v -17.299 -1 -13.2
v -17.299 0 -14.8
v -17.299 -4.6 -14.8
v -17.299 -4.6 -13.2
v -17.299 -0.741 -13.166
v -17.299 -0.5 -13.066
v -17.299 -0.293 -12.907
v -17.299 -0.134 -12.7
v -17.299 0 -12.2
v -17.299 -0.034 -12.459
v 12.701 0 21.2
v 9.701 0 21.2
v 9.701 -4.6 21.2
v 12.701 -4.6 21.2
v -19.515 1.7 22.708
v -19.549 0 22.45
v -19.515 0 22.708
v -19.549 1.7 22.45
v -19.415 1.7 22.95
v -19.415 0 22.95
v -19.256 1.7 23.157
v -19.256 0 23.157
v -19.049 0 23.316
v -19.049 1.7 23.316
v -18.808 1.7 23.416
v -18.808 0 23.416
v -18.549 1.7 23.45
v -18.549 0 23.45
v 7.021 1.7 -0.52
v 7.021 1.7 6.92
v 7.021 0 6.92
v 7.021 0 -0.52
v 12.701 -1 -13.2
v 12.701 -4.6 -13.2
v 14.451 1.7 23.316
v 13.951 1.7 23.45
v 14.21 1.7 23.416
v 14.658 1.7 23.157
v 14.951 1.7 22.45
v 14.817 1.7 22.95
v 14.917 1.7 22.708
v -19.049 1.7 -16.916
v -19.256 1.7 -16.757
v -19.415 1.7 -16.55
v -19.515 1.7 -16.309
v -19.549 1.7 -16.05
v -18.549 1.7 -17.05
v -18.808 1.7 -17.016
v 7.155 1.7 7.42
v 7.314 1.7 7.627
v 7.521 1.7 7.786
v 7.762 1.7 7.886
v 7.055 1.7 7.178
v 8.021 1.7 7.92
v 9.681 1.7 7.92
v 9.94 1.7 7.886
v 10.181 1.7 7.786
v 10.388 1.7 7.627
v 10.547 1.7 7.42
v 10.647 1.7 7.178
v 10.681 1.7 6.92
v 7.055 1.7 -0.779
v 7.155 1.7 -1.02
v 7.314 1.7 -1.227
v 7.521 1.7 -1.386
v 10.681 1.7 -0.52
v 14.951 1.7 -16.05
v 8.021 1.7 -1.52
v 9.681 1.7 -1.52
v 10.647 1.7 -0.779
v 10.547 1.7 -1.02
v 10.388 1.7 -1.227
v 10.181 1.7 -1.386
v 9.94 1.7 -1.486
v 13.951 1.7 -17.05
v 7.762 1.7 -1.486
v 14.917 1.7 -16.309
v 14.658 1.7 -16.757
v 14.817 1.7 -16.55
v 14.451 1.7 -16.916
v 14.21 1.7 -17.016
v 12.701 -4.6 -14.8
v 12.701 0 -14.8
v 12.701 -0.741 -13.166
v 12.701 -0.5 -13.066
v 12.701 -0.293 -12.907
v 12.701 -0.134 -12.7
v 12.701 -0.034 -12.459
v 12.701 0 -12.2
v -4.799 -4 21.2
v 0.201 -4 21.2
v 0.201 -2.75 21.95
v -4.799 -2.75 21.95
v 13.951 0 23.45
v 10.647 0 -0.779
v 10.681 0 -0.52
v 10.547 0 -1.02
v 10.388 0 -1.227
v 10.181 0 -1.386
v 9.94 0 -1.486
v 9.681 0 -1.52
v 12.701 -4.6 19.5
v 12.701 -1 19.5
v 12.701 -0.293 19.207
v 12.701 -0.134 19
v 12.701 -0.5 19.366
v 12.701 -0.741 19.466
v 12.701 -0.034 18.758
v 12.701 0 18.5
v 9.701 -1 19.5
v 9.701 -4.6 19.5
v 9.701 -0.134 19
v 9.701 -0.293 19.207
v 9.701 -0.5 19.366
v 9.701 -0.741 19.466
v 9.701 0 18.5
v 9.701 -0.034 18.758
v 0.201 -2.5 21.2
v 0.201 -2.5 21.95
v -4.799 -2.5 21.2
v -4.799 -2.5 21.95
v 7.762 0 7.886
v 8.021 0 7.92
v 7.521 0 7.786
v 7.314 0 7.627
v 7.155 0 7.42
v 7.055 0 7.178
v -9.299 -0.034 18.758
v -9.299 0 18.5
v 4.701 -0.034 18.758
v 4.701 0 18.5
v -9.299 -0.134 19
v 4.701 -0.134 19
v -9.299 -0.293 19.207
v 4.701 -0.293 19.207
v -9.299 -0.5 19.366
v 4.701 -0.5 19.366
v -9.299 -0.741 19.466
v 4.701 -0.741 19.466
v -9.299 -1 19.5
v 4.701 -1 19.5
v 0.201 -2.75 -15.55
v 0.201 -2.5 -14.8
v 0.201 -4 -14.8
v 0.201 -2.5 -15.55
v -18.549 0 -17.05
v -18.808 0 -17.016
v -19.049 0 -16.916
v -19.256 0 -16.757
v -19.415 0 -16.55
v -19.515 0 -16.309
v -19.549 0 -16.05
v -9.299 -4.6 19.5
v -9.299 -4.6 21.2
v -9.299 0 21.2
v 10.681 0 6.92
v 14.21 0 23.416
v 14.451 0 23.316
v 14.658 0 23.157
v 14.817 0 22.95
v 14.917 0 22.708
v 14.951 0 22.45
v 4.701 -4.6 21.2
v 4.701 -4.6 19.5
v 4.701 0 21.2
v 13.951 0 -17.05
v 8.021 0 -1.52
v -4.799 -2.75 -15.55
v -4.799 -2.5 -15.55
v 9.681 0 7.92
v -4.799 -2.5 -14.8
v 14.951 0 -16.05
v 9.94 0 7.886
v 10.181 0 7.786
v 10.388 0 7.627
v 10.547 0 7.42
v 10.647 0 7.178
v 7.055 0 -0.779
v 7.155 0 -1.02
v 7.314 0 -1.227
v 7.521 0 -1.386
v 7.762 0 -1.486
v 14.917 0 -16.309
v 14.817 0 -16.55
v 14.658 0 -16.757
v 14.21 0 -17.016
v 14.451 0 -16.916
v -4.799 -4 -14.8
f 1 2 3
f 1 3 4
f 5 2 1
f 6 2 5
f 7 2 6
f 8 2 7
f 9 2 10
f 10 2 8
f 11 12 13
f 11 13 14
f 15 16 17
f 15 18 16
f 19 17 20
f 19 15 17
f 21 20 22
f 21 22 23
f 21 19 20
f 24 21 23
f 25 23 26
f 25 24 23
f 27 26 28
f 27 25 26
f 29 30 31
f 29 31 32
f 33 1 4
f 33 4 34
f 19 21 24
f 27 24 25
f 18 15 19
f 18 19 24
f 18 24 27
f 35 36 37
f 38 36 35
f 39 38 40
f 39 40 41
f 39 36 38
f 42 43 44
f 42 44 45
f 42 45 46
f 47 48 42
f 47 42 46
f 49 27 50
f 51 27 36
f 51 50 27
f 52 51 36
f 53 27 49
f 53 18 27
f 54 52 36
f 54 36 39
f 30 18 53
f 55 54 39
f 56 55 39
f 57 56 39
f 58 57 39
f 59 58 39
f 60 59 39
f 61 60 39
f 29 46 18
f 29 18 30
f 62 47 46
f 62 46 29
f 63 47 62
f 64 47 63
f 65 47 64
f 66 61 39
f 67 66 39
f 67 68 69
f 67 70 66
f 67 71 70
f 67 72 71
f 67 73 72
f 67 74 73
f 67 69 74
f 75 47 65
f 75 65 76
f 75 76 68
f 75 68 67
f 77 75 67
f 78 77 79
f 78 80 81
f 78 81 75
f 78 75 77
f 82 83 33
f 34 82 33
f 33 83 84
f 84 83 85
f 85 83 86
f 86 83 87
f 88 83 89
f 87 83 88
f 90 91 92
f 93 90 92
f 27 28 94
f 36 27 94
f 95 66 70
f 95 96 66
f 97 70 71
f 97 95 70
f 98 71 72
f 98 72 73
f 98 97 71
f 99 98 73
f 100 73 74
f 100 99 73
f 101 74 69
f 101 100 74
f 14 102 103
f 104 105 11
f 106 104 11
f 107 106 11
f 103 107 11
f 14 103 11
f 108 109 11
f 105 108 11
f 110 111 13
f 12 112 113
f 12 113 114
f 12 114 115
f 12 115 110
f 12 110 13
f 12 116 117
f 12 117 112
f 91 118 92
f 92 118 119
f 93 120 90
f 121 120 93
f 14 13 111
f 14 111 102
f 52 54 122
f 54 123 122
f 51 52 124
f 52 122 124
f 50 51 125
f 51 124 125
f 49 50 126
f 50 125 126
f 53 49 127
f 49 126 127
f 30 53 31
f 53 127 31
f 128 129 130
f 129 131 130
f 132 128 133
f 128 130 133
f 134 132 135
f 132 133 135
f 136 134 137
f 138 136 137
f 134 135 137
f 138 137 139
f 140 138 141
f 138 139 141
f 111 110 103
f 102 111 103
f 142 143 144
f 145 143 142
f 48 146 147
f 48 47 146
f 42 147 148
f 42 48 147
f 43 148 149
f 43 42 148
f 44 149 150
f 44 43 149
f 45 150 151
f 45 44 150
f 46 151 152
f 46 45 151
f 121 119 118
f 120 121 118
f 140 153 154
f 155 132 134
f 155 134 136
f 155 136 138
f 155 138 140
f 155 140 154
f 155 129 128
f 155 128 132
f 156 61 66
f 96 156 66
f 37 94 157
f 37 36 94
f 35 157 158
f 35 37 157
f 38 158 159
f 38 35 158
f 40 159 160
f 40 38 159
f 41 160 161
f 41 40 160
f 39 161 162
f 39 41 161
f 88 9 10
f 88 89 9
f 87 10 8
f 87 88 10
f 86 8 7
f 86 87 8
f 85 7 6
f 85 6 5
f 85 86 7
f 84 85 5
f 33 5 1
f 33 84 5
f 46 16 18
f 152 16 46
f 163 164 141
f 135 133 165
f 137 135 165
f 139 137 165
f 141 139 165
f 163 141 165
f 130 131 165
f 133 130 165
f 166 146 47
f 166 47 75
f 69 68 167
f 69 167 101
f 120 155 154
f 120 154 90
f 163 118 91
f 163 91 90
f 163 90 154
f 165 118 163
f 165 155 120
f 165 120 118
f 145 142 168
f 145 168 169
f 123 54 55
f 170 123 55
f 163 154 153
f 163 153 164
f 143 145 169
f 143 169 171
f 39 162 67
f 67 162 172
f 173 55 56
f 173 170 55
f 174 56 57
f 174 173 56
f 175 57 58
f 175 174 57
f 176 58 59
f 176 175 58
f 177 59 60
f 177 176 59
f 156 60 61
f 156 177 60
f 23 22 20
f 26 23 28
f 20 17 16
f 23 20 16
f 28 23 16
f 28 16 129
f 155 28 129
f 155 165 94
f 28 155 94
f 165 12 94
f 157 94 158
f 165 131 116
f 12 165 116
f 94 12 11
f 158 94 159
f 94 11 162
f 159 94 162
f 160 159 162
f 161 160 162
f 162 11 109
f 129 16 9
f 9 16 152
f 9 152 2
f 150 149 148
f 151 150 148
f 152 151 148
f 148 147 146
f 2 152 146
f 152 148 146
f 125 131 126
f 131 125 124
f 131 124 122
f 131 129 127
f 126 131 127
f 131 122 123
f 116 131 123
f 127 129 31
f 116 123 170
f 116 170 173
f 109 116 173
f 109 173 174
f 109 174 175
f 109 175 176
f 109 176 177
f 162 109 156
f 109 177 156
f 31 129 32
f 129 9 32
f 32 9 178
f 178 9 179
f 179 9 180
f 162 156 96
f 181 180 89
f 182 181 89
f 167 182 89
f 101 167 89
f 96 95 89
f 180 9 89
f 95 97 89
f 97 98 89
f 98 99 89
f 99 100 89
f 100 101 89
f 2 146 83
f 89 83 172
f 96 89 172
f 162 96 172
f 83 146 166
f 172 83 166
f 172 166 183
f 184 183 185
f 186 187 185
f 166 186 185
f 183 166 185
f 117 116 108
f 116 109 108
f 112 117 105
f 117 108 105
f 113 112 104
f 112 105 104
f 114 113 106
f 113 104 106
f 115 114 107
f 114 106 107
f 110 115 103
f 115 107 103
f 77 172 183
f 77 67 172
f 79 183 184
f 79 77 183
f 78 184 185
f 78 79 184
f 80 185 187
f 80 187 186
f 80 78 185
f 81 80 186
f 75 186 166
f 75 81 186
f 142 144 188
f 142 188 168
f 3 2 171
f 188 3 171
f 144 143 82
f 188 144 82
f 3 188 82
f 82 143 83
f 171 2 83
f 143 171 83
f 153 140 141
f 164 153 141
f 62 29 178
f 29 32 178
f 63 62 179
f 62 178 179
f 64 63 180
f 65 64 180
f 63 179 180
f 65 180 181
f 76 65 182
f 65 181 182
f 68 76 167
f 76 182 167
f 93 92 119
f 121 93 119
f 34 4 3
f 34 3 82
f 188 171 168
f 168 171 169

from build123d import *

# Parameters (mm, degrees)
SKETCH1_W           = 34.5
SKETCH1_H           = 40.5
BOSS_EXTRUDE1_DEPTH = 1.7
SKETCH2_W           = 3.66
SKETCH2_H           = 9.44
CUT_EXTRUDE1_DEPTH  = 1.7
FILLET1_R           = 1
FILLET2_R           = 1
FILLET3_R           = 1
FILLET4_R           = 1
FILLET5_R           = 1
FILLET6_R           = 1
FILLET7_R           = 1
FILLET8_R           = 1
SKETCH3_W           = 30
SKETCH3_H           = 1.6
BOSS_EXTRUDE2_DEPTH = 4.6
SKETCH4_W           = 3
SKETCH4_H           = 1.7
SKETCH4_W_2         = 14
BOSS_EXTRUDE3_DEPTH = 4.6
BOSS_EXTRUDE4_START = -14.75
BOSS_EXTRUDE4_DEPTH = 5
FILLET9_R           = 1
FILLET10_R          = 1
FILLET11_R          = 1


with BuildPart() as part:
    # Sketch1 → Boss-Extrude1 (new body)
    with BuildSketch(Plane(origin=(0, 0, 0), x_dir=(1, 0, 0), z_dir=(0, 1, 0))):
        with Locations((-2.298701299, -3.199675325)):
            Rectangle(SKETCH1_W, SKETCH1_H)
    extrude(amount=BOSS_EXTRUDE1_DEPTH)

    # Sketch2 → Cut-Extrude1 (cut)
    with BuildSketch(Plane(origin=(0, 1.7, 0), x_dir=(1, 0, 0), z_dir=(0, 1, 0))):
        with Locations((8.851298701, -3.199675325)):
            Rectangle(SKETCH2_W, SKETCH2_H)
    extrude(amount=-CUT_EXTRUDE1_DEPTH, mode=Mode.SUBTRACT)

    # Fillet1
    fillet1_edges = [part.edges().sort_by_distance(p)[0] for p in [
        (14.951298701, 0.85, 23.449675325),
    ]]
    fillet(fillet1_edges, radius=FILLET1_R)

    # Fillet2
    fillet2_edges = [part.edges().sort_by_distance(p)[0] for p in [
        (14.951298701, 0.85, -17.050324675),
    ]]
    fillet(fillet2_edges, radius=FILLET2_R)

    # Fillet3
    fillet3_edges = [part.edges().sort_by_distance(p)[0] for p in [
        (-19.548701299, 0.85, -17.050324675),
    ]]
    fillet(fillet3_edges, radius=FILLET3_R)

    # Fillet4
    fillet4_edges = [part.edges().sort_by_distance(p)[0] for p in [
        (-19.548701299, 0.85, 23.449675325),
    ]]
    fillet(fillet4_edges, radius=FILLET4_R)

    # Fillet5
    fillet5_edges = [part.edges().sort_by_distance(p)[0] for p in [
        (7.021298701, 0.85, 7.919675325),
    ]]
    fillet(fillet5_edges, radius=FILLET5_R)

    # Fillet6
    fillet6_edges = [part.edges().sort_by_distance(p)[0] for p in [
        (7.021298701, 0.85, -1.520324675),
    ]]
    fillet(fillet6_edges, radius=FILLET6_R)

    # Fillet7
    fillet7_edges = [part.edges().sort_by_distance(p)[0] for p in [
        (10.681298701, 0.85, 7.919675325),
    ]]
    fillet(fillet7_edges, radius=FILLET7_R)

    # Fillet8
    fillet8_edges = [part.edges().sort_by_distance(p)[0] for p in [
        (10.681298701, 0.85, -1.520324675),
    ]]
    fillet(fillet8_edges, radius=FILLET8_R)

    # Sketch3 → Boss-Extrude2 (add)
    with BuildSketch(Plane.XZ):
        with Locations((-2.298701299, -14.000324675)):
            Rectangle(SKETCH3_W, SKETCH3_H)
    extrude(amount=BOSS_EXTRUDE2_DEPTH)

    # Sketch4 → Boss-Extrude3 (add)
    with BuildSketch(Plane.XZ):
        with Locations((11.201298701, 20.349675325)):
            Rectangle(SKETCH4_W, SKETCH4_H)
        with Locations((-2.298701299, 20.349675325)):
            Rectangle(SKETCH4_W_2, SKETCH4_H)
    extrude(amount=BOSS_EXTRUDE3_DEPTH)

    # Sketch5 → Boss-Extrude4 (add)
    with BuildSketch(Plane(origin=(14.951298701, 0, 0), x_dir=(0, 0, -1), z_dir=(1, 0, 0)).offset(BOSS_EXTRUDE4_START)):
        Polygon((14.800324675, -2.5), (14.800324675, -4), (15.550324675, -2.75), (15.550324675, -2.5), align=None)
        Polygon((-21.949675325, -2.5), (-21.199675325, -2.5), (-21.199675325, -4), (-21.949675325, -2.75), align=None)
    extrude(amount=-BOSS_EXTRUDE4_DEPTH)

    # Fillet9
    fillet9_edges = [part.edges().sort_by_distance(p)[0] for p in [
        (11.201298701, 0, 19.499675325),
    ]]
    fillet(fillet9_edges, radius=FILLET9_R)

    # Fillet10
    fillet10_edges = [part.edges().sort_by_distance(p)[0] for p in [
        (-2.298701299, 0, 19.499675325),
    ]]
    fillet(fillet10_edges, radius=FILLET10_R)

    # Fillet11
    fillet11_edges = [part.edges().sort_by_distance(p)[0] for p in [
        (-2.298701299, 0, -13.200324675),
    ]]
    fillet(fillet11_edges, radius=FILLET11_R)


solid = part.part
